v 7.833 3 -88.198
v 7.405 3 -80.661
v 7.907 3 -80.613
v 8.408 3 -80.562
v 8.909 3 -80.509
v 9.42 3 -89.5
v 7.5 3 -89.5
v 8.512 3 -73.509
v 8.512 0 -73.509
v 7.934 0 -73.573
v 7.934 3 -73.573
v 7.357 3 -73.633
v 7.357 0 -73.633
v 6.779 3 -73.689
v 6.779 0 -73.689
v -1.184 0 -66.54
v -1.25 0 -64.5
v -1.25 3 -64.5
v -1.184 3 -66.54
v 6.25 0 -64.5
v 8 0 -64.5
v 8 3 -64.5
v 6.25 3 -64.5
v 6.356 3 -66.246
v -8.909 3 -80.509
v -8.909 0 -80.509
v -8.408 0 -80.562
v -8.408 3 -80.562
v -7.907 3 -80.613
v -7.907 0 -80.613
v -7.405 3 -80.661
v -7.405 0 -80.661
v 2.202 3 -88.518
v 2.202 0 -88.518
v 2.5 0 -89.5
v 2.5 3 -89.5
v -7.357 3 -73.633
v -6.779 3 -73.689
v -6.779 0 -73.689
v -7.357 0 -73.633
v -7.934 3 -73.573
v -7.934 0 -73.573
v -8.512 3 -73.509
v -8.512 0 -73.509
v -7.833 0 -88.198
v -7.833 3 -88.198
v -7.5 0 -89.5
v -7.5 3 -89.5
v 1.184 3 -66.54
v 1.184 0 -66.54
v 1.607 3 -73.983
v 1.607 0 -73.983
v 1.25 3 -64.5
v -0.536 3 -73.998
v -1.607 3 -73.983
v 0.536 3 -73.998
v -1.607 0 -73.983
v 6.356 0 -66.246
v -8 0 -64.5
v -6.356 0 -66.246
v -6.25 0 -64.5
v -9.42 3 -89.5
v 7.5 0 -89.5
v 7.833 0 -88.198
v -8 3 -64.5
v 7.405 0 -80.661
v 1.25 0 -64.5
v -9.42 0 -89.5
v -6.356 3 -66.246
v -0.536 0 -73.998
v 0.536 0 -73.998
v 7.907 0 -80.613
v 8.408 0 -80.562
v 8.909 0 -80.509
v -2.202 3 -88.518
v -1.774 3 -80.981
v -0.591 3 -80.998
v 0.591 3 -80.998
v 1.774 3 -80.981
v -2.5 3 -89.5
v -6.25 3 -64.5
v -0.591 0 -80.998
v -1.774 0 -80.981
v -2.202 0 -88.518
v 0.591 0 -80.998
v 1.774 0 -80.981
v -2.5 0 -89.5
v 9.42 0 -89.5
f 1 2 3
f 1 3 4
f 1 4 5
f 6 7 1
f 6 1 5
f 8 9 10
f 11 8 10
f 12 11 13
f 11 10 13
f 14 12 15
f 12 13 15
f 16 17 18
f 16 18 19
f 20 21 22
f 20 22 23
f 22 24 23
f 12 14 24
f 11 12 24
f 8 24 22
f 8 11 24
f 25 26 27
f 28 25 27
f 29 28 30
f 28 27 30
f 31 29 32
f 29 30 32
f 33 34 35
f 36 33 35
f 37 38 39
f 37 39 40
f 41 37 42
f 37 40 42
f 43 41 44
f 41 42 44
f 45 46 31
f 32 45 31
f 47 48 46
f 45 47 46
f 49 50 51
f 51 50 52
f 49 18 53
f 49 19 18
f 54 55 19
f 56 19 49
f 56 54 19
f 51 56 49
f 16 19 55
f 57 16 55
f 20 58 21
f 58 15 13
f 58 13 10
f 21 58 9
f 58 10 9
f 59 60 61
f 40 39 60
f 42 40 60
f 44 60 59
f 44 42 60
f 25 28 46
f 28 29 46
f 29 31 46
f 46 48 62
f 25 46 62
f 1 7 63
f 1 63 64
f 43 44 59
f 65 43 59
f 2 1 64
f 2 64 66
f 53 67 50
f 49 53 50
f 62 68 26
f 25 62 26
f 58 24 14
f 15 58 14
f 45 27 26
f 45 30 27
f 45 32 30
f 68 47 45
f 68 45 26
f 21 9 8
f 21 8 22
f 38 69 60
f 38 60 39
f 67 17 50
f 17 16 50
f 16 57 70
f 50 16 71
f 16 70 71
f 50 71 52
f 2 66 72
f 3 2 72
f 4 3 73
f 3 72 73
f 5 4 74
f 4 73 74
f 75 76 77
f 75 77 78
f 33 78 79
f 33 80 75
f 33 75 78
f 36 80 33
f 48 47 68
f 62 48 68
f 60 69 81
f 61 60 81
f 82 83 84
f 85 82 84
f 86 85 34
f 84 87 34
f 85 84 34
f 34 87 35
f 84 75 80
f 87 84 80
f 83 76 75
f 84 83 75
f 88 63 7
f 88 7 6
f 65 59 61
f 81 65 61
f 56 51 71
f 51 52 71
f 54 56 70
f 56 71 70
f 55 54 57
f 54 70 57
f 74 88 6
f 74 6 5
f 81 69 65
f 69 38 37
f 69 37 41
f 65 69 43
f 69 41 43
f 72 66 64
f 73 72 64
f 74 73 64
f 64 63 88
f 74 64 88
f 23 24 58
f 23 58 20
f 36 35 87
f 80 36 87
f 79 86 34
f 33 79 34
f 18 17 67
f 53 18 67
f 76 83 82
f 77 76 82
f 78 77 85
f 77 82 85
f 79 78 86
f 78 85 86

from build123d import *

# Parameters (mm, degrees)
BOSS_EXTRUDE1_DEPTH      = 3
CUT_EXTRUDE1_DEPTH       = 91.044316414
BOSS_EXTRUDE2_DEPTH      = 3
CUT_EXTRUDE7_DEPTH       = 91.044316414
CUT_EXTRUDE9_DEPTH       = 91.044316414
MIRROR10_DEPTH           = 3
CUT_EXTRUDE10_DEPTH      = 91.044316414
CUT_EXTRUDE10_DEPTH_BACK = 91.044316414


# Read off the part's stored shape, not the designer's step: Mirror10
with BuildPart() as part:
    # Sketch1 → Boss-Extrude1 (new body)
    with BuildSketch(Plane(origin=(0, 0, 0), x_dir=(1, 0, 0), z_dir=(0, 1, 0))):
        Polygon((-9.419602878, 89.5), (-8, 64.5), (0, 64.5), (0, 89.5), align=None)
    extrude(amount=BOSS_EXTRUDE1_DEPTH)

    # Sketch2 → Cut-Extrude1 (cut, symmetric)
    with BuildSketch(Plane(origin=(0, 3, 0), x_dir=(1, 0, 0), z_dir=(0, 1, 0))):
        Polygon((-6.585534884, 66.233172431), (-0.954605862, 66.552919753), (-2.201847188, 88.517536505), (-7.83277621, 88.197789183), align=None)
    extrude(amount=CUT_EXTRUDE1_DEPTH, both=True, mode=Mode.SUBTRACT)

    # Sketch6 → Boss-Extrude2 (add)
    with BuildSketch(Plane(origin=(0, 3, 0), x_dir=(1, 0, 0), z_dir=(0, 1, 0))):
        Polygon((-6.585534884, 66.233172431), (-6.3559048, 66.246211772), (-6.866139888, 75.231736807), (-7.322541122, 79.212264148), align=None)
    boss_extrude2 = extrude(amount=-BOSS_EXTRUDE2_DEPTH)

    # Mirror3: Boss-Extrude2 across plane
    add(boss_extrude2.mirror(Plane(origin=(0, 0, 0), x_dir=(0.05669278756337804, 0, 0.9983916705573488), z_dir=(0.9983916705573489, 0, -0.05669278756337803))))

    # Sketch7 → Cut-Extrude7 (cut, symmetric)
    with BuildSketch(Plane(origin=(0, 3, 0), x_dir=(1, 0, 0), z_dir=(0, 1, 0))):
        Polygon((-7.5, 89.5), (-7.83277621, 88.197789183), (-2.201847188, 88.517536505), (-2.5, 89.5), align=None)
    extrude(amount=CUT_EXTRUDE7_DEPTH, both=True, mode=Mode.SUBTRACT)

    # Sketch14 → Cut-Extrude9 (cut, symmetric)
    with BuildSketch(Plane(origin=(0, 3, 0), x_dir=(1, 0, 0), z_dir=(0, 1, 0))):
        Polygon((-6.3559048, 66.246211772), (-6.25, 64.5), (-1.25, 64.5), (-1.184235946, 66.539880412), align=None)
    extrude(amount=CUT_EXTRUDE9_DEPTH, both=True, mode=Mode.SUBTRACT)


with BuildPart() as cut_extrude9_piece_1:
    # of the separate pieces the step leaves, piece 1, a body of its own (cut_extrude9_pieces)
    add(part.part.solids().sort_by_distance((-1.25, 0, -64.5))[0])

    # Mirror10 outline → Mirror10 (add)
    with BuildSketch(Plane(origin=(0, 0, 0), x_dir=(1, 0, 0), z_dir=(0, 1, 0))):
        Polygon((0, 64.5), (1.25, 64.5), (1.184235946, 66.539880412), (1.694471034, 75.525405447), (1.6916121, 79.53201147), (2.201847188, 88.517536505), (2.5, 89.5), (0, 89.5), align=None)
    extrude(amount=MIRROR10_DEPTH)


with BuildPart() as cut_extrude9_piece_2:
    # of the separate pieces the step leaves, piece 2, a body of its own (cut_extrude9_pieces)
    add(part.part.solids().sort_by_distance((-9.419602878, 0, -89.5))[0])


with BuildPart() as body_3:
    # Mirror12: mirrored copy
    add(cut_extrude9_piece_2.part.mirror(Plane(origin=(0, 0, 0), x_dir=(0, 0, 1), z_dir=(1, 0, 0))))


with BuildPart() as cut_extrude10_tool:
    # Sketch15 → Cut-Extrude10 (new, two sides: drawn at the far end of the back side and taken through both)
    with BuildSketch(Plane(origin=(0, 3, 0), x_dir=(1, 0, 0), z_dir=(0, 1, 0)).offset(-CUT_EXTRUDE10_DEPTH_BACK)):
        with BuildLine():
            Line((-8.511560468, 73.508865713), (-8.909032235, 80.50856566))
            ThreePointArc((-8.909032235, 80.50856566), (0, 81), (8.909032235, 80.50856566))
            Line((8.909032235, 80.50856566), (8.511560468, 73.508865713))
            ThreePointArc((8.511560468, 73.508865713), (0, 74), (-8.511560468, 73.508865713))
        make_face()
    extrude(amount=CUT_EXTRUDE10_DEPTH + CUT_EXTRUDE10_DEPTH_BACK)


with BuildPart() as cut_extrude9_piece_1_1:
    add(cut_extrude9_piece_1.part)

    # Cut-Extrude10: cut by cut_extrude10_tool
    add(cut_extrude10_tool.part, mode=Mode.SUBTRACT)


with BuildPart() as cut_extrude9_piece_2_1:
    add(cut_extrude9_piece_2.part)

    # Cut-Extrude10: cut by cut_extrude10_tool
    add(cut_extrude10_tool.part, mode=Mode.SUBTRACT)


with BuildPart() as body_3_1:
    add(body_3.part)

    # Cut-Extrude10: cut by cut_extrude10_tool
    add(cut_extrude10_tool.part, mode=Mode.SUBTRACT)


with BuildPart() as cut_extrude10_piece_1:
    # of the separate pieces the step leaves, piece 1, a body of its own (cut_extrude10_pieces)
    add(cut_extrude9_piece_1_1.part.solids().sort_by_distance((-1.773867452, 0, -80.980574178))[0])


with BuildPart() as cut_extrude10_piece_2:
    # of the separate pieces the step leaves, piece 2, a body of its own (cut_extrude10_pieces)
    add(cut_extrude9_piece_1_1.part.solids().sort_by_distance((-1.25, 0, -64.5))[0])


with BuildPart() as cut_extrude10_piece_1_of_cut_extrude9_pi:
    # of the separate pieces the step leaves, piece 1, a body of its own (cut_extrude10_pieces_of_cut_extrude9_pie)
    add(cut_extrude9_piece_2_1.part.solids().sort_by_distance((-8.511560468, 0, -73.508865713))[0])


with BuildPart() as cut_extrude10_piece_2_of_cut_extrude9_pi:
    # of the separate pieces the step leaves, piece 2, a body of its own (cut_extrude10_pieces_of_cut_extrude9_pie)
    add(cut_extrude9_piece_2_1.part.solids().sort_by_distance((-9.419602878, 0, -89.5))[0])


with BuildPart() as cut_extrude10_piece_1_of_body_3:
    # of the separate pieces the step leaves, piece 1, a body of its own (cut_extrude10_pieces_of_body_3)
    add(body_3_1.part.solids().sort_by_distance((8.511560468, 0, -73.508865713))[0])


with BuildPart() as cut_extrude10_piece_2_of_body_3:
    # of the separate pieces the step leaves, piece 2, a body of its own (cut_extrude10_pieces_of_body_3)
    add(body_3_1.part.solids().sort_by_distance((9.419602878, 0, -89.5))[0])


solid = Compound([cut_extrude10_piece_1.part, cut_extrude10_piece_2.part, cut_extrude10_piece_1_of_cut_extrude9_pi.part, cut_extrude10_piece_2_of_cut_extrude9_pi.part, cut_extrude10_piece_1_of_body_3.part, cut_extrude10_piece_2_of_body_3.part])
